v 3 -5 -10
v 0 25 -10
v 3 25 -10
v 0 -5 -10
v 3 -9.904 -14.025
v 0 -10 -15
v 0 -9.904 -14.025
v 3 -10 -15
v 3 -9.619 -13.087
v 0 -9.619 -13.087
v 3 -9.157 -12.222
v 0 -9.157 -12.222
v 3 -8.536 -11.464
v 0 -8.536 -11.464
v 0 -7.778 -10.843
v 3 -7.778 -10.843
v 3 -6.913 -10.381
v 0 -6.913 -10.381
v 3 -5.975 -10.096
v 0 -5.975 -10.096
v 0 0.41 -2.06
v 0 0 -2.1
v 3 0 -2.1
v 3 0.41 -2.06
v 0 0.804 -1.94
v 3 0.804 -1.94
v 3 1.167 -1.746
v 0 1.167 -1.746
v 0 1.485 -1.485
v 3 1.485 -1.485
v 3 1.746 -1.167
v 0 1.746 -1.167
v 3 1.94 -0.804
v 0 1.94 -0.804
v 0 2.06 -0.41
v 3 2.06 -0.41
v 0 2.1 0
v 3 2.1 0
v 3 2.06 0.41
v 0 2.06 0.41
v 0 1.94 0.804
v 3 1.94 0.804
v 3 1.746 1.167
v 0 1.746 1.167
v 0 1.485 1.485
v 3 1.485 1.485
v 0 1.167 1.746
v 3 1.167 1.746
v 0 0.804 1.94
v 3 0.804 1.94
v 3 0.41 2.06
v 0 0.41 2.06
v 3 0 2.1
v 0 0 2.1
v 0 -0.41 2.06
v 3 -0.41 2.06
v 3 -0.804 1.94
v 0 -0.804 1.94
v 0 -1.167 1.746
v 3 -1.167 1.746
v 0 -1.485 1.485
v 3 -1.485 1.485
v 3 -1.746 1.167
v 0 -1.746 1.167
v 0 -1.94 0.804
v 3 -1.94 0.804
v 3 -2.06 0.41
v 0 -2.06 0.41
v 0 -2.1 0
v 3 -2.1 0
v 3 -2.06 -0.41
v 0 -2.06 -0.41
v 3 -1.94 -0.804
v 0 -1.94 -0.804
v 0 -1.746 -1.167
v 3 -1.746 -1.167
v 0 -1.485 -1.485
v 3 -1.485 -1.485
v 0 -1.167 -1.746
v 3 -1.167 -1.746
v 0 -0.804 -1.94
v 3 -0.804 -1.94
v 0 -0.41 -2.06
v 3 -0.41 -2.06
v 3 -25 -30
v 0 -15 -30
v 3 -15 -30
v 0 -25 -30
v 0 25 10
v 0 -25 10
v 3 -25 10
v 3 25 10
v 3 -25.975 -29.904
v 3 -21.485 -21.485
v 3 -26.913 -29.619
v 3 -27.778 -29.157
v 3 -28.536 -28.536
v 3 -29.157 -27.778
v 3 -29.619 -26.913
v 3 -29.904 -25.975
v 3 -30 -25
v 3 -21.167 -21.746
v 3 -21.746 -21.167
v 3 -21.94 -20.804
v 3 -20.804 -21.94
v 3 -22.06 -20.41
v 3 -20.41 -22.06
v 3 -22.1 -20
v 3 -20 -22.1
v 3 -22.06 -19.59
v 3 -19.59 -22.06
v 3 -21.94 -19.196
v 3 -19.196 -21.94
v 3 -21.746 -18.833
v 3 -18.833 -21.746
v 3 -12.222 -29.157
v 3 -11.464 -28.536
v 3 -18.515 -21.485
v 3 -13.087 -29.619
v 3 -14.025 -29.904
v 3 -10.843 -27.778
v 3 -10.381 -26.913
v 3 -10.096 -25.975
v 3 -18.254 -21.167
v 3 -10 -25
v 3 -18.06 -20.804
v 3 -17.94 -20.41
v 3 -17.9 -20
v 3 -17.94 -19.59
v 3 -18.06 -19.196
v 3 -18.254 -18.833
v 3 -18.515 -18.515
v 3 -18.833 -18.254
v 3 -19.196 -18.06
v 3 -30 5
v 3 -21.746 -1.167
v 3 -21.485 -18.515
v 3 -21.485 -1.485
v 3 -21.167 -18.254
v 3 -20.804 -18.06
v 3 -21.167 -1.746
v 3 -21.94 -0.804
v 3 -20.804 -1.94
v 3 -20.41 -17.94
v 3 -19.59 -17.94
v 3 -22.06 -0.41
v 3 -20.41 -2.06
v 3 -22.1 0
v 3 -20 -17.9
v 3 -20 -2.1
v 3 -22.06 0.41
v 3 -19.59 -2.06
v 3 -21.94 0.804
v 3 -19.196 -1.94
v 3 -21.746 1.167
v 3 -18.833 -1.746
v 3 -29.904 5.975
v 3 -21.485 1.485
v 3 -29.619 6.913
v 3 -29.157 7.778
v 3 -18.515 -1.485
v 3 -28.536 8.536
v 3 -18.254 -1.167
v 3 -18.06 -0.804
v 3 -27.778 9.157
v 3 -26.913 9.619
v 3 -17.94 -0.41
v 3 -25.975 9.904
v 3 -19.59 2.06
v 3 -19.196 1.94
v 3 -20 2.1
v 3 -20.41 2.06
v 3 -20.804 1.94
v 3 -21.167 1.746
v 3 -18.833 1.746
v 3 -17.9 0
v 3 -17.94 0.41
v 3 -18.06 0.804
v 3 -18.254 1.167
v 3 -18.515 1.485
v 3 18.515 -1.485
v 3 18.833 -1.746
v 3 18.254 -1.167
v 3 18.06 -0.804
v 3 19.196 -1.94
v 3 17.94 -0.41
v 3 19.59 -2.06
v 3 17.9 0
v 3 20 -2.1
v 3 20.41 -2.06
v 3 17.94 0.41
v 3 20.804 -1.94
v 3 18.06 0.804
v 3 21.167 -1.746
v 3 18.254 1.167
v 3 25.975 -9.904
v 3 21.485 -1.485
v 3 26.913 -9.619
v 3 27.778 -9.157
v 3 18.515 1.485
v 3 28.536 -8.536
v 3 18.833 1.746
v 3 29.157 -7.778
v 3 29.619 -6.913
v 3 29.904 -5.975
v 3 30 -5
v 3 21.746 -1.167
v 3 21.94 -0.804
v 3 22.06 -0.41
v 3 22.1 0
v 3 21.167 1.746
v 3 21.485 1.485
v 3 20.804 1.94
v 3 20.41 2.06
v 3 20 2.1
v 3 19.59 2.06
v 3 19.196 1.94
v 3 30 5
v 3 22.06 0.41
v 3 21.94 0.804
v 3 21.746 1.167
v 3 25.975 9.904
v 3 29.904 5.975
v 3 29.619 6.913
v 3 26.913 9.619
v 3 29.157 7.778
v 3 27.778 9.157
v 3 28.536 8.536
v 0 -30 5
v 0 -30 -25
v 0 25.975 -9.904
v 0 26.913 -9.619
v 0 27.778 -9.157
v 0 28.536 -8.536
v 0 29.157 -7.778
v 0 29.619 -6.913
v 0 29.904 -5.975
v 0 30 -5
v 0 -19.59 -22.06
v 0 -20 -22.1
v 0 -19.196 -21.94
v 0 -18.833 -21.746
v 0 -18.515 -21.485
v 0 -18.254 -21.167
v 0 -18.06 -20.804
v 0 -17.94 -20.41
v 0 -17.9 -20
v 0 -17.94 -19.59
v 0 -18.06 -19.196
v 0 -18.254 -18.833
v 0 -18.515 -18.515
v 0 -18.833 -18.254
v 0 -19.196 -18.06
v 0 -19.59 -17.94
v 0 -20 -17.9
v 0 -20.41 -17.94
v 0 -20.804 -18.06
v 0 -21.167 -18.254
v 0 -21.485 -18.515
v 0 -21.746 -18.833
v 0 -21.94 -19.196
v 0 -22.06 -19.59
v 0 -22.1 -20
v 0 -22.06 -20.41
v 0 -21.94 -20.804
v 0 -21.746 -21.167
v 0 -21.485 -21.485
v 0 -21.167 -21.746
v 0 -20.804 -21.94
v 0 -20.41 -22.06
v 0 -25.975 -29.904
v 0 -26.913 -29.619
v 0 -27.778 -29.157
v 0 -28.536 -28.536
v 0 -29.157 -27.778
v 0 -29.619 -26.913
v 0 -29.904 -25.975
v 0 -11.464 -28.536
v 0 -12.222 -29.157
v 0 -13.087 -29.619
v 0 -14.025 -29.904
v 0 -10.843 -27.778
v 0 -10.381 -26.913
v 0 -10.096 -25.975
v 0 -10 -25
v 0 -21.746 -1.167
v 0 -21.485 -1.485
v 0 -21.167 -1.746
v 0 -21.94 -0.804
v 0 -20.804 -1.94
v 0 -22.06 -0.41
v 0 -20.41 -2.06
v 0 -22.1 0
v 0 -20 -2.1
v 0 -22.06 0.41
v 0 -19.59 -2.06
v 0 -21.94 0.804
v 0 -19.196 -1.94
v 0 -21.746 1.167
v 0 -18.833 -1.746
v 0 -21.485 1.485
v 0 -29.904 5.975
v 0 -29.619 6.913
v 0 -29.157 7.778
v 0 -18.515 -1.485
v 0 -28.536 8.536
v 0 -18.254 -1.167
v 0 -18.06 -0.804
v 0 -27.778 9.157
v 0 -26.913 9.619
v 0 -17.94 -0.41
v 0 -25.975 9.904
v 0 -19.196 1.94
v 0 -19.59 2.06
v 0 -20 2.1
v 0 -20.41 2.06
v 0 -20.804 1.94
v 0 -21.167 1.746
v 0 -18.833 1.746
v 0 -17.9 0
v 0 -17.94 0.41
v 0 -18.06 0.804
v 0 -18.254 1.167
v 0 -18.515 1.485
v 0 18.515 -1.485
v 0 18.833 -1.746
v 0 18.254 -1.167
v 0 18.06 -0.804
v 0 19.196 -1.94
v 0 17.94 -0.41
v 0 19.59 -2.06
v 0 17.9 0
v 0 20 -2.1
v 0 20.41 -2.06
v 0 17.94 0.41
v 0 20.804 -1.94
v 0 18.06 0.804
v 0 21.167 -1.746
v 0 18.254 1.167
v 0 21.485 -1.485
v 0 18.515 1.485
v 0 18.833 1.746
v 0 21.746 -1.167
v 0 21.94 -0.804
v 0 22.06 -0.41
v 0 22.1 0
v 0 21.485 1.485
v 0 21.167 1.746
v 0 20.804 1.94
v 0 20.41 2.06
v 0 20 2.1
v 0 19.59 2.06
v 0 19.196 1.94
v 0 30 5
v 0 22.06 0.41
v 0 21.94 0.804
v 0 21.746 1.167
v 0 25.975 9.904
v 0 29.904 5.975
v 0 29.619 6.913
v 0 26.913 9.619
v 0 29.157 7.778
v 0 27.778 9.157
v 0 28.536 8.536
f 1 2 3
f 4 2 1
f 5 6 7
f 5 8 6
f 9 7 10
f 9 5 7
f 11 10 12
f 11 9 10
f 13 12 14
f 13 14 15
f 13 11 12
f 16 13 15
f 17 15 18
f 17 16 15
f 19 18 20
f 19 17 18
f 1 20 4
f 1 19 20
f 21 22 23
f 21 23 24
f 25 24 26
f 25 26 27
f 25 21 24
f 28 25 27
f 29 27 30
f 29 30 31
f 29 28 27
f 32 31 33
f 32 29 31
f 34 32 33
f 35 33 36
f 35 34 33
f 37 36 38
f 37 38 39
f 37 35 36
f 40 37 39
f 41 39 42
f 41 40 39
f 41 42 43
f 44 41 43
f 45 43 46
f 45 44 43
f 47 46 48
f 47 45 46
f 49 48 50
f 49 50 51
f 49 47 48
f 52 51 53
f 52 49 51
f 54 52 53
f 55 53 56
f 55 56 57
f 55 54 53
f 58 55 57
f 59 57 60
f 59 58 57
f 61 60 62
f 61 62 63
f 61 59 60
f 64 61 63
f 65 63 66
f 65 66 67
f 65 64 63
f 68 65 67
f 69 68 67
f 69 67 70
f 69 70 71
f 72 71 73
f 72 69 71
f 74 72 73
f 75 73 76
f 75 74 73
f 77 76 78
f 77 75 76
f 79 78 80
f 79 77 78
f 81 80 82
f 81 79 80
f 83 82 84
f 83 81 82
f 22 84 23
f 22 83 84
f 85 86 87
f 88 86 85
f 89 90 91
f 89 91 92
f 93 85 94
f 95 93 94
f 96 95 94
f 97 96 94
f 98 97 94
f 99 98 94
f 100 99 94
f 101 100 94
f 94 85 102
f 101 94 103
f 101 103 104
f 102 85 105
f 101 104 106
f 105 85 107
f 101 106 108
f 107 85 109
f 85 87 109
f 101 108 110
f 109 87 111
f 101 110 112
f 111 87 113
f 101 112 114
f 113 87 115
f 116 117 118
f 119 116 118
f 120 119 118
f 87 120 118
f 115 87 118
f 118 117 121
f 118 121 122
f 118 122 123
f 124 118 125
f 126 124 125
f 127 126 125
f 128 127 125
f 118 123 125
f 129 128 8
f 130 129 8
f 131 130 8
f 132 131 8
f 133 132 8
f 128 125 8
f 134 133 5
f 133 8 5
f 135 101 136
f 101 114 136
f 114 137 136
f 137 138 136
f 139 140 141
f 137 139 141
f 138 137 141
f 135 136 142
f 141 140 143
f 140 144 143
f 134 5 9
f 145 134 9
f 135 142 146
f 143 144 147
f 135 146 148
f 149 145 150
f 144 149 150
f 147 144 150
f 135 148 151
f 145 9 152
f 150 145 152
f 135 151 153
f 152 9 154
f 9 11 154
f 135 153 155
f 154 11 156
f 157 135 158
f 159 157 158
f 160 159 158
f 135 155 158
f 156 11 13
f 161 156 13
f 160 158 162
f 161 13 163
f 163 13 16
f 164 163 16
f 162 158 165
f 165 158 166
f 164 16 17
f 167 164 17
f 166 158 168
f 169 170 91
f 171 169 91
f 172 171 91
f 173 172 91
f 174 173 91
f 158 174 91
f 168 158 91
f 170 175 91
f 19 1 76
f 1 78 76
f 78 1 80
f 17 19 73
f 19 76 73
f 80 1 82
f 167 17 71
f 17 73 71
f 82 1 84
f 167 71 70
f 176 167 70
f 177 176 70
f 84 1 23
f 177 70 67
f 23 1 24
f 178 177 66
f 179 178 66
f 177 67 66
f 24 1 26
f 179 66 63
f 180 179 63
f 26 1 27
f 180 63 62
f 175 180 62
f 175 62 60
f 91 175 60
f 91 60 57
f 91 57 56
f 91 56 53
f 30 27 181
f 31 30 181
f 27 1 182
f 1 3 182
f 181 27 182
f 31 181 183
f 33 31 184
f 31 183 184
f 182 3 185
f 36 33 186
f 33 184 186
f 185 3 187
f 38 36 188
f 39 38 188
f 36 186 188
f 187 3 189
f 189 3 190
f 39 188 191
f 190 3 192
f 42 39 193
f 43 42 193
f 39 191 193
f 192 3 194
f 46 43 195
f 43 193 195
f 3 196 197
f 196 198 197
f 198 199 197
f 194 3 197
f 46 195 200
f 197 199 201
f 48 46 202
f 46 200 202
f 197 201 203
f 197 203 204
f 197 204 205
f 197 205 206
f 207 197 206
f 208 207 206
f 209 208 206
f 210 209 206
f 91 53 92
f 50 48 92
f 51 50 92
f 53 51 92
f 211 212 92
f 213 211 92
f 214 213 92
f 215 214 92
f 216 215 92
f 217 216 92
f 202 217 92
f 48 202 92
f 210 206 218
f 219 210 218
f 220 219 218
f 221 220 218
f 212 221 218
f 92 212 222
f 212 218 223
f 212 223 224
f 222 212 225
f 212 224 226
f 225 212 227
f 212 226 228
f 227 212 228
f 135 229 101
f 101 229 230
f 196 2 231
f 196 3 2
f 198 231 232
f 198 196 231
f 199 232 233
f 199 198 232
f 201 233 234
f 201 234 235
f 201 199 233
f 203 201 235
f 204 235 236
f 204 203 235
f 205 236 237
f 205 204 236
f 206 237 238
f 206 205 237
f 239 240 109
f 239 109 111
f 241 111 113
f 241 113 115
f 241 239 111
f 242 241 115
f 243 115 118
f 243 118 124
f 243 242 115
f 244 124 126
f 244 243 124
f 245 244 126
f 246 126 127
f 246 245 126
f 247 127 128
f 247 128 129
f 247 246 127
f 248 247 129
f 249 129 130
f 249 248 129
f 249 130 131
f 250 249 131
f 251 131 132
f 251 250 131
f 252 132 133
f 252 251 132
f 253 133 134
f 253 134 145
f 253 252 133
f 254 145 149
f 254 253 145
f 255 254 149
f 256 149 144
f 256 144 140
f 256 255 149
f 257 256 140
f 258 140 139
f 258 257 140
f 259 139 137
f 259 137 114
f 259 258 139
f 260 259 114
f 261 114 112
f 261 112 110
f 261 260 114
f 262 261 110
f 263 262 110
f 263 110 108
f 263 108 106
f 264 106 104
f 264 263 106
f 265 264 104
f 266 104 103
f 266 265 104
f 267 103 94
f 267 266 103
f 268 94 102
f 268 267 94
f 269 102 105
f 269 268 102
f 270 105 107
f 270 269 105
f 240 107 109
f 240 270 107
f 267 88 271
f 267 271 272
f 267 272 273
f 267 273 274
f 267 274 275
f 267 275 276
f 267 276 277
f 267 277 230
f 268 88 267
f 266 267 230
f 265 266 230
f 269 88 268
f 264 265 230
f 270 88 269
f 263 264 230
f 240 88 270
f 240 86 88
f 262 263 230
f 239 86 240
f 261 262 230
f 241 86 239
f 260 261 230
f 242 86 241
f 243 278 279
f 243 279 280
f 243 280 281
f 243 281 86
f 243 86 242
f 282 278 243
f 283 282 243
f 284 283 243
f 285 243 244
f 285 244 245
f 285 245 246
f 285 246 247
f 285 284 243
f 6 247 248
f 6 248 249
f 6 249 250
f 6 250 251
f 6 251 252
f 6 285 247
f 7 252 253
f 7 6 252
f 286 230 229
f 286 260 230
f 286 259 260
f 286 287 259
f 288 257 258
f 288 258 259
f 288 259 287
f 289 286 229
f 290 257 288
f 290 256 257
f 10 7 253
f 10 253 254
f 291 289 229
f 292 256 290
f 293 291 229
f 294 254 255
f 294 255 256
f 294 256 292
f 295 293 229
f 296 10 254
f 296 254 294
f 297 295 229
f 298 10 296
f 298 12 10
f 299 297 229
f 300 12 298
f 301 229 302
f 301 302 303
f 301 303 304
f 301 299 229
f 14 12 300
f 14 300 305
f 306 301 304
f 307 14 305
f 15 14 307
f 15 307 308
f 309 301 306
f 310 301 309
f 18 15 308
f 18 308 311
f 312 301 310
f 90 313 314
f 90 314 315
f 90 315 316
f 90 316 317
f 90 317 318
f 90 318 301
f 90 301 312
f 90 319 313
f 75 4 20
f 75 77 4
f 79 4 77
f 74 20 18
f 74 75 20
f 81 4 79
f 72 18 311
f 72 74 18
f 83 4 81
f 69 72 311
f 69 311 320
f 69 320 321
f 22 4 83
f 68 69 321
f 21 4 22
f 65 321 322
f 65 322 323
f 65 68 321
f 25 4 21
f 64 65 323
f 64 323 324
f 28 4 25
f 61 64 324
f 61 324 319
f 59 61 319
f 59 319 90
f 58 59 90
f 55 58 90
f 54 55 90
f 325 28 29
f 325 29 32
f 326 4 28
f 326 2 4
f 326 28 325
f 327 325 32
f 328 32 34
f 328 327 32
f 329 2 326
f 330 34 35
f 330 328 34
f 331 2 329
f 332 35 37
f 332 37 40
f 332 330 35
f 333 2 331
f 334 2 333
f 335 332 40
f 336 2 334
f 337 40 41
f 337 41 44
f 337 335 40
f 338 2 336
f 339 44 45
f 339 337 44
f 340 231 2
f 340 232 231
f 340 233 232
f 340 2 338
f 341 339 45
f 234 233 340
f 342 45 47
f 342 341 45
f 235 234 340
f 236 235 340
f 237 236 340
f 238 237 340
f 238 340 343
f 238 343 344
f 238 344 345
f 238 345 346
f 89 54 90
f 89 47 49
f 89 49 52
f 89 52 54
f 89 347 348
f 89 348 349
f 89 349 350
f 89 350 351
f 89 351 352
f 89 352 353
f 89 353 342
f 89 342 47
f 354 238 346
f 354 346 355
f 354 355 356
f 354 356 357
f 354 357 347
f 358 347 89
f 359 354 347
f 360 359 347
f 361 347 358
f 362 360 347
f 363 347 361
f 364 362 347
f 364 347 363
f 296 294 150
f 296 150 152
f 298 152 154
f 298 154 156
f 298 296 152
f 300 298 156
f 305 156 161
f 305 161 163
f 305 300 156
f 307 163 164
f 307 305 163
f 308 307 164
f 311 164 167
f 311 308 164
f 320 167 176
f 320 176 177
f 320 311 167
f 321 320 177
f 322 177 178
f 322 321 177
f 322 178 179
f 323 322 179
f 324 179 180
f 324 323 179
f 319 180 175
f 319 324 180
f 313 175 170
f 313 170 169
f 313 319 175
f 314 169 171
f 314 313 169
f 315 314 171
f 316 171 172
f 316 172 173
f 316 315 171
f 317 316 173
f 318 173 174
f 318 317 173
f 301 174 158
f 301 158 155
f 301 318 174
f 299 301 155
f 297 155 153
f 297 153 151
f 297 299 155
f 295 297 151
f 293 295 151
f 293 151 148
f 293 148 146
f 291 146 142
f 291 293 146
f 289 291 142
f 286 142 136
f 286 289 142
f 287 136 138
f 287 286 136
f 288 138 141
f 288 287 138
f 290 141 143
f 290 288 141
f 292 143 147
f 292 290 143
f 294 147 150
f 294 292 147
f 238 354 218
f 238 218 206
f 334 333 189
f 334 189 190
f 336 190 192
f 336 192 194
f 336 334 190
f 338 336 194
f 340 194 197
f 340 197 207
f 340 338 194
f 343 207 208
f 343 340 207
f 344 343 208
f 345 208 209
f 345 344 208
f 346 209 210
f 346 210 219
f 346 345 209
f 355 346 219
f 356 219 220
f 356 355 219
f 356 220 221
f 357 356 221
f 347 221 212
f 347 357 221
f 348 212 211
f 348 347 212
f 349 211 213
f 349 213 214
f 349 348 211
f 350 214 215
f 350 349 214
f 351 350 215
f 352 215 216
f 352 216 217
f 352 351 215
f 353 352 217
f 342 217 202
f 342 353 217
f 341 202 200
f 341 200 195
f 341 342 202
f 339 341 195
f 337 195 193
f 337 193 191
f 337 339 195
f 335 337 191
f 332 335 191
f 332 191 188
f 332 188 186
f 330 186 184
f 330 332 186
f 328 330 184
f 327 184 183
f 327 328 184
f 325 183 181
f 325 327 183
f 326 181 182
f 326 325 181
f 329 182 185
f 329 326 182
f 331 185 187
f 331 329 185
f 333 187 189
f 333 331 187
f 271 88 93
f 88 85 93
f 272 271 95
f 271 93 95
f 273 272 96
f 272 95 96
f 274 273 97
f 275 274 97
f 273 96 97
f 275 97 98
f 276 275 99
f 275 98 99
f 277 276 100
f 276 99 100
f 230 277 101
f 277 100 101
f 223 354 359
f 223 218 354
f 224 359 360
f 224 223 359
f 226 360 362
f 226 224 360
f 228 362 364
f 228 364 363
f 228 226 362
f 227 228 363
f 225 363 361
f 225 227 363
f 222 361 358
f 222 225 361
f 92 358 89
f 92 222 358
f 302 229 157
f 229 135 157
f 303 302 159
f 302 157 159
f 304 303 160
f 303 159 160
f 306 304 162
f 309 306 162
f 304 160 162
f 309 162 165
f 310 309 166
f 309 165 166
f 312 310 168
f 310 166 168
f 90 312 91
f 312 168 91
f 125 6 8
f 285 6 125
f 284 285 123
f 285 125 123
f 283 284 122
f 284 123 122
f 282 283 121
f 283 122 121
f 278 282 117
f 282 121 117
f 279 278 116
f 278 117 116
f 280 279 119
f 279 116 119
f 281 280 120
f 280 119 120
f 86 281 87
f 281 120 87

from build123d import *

# Parameters (mm, degrees)
SKETCH_1_R      = 2.1
EXTRUDE_1_DEPTH = 3
FILLET_2_R      = 5


with BuildPart() as part:
    # 草图1 → 凸台-拉伸1 (new body)
    with BuildSketch(Plane(origin=(0, 0, 0), x_dir=(0, 0, -1), z_dir=(1, 0, 0))):
        Polygon((10, -10), (30, -10), (30, -30), (10, -30), (-10, -30), (-10, 30), (10, 30), align=None)
        with Locations((0, 20)):
            Circle(SKETCH_1_R, mode=Mode.SUBTRACT)
        Circle(SKETCH_1_R, mode=Mode.SUBTRACT)
        with Locations((0, -20)):
            Circle(SKETCH_1_R, mode=Mode.SUBTRACT)
        with Locations((20, -20)):
            Circle(SKETCH_1_R, mode=Mode.SUBTRACT)
    extrude(amount=EXTRUDE_1_DEPTH)

    # 圆角2
    fillet_2_edges = [part.edges().sort_by_distance(p)[0] for p in [
        (1.5, -30, 10),
        (1.5, 30, 10),
        (1.5, 30, -10),
        (1.5, -10, -10),
        (1.5, -10, -30),
        (1.5, -30, -30),
    ]]
    fillet(fillet_2_edges, radius=FILLET_2_R)


solid = part.part
